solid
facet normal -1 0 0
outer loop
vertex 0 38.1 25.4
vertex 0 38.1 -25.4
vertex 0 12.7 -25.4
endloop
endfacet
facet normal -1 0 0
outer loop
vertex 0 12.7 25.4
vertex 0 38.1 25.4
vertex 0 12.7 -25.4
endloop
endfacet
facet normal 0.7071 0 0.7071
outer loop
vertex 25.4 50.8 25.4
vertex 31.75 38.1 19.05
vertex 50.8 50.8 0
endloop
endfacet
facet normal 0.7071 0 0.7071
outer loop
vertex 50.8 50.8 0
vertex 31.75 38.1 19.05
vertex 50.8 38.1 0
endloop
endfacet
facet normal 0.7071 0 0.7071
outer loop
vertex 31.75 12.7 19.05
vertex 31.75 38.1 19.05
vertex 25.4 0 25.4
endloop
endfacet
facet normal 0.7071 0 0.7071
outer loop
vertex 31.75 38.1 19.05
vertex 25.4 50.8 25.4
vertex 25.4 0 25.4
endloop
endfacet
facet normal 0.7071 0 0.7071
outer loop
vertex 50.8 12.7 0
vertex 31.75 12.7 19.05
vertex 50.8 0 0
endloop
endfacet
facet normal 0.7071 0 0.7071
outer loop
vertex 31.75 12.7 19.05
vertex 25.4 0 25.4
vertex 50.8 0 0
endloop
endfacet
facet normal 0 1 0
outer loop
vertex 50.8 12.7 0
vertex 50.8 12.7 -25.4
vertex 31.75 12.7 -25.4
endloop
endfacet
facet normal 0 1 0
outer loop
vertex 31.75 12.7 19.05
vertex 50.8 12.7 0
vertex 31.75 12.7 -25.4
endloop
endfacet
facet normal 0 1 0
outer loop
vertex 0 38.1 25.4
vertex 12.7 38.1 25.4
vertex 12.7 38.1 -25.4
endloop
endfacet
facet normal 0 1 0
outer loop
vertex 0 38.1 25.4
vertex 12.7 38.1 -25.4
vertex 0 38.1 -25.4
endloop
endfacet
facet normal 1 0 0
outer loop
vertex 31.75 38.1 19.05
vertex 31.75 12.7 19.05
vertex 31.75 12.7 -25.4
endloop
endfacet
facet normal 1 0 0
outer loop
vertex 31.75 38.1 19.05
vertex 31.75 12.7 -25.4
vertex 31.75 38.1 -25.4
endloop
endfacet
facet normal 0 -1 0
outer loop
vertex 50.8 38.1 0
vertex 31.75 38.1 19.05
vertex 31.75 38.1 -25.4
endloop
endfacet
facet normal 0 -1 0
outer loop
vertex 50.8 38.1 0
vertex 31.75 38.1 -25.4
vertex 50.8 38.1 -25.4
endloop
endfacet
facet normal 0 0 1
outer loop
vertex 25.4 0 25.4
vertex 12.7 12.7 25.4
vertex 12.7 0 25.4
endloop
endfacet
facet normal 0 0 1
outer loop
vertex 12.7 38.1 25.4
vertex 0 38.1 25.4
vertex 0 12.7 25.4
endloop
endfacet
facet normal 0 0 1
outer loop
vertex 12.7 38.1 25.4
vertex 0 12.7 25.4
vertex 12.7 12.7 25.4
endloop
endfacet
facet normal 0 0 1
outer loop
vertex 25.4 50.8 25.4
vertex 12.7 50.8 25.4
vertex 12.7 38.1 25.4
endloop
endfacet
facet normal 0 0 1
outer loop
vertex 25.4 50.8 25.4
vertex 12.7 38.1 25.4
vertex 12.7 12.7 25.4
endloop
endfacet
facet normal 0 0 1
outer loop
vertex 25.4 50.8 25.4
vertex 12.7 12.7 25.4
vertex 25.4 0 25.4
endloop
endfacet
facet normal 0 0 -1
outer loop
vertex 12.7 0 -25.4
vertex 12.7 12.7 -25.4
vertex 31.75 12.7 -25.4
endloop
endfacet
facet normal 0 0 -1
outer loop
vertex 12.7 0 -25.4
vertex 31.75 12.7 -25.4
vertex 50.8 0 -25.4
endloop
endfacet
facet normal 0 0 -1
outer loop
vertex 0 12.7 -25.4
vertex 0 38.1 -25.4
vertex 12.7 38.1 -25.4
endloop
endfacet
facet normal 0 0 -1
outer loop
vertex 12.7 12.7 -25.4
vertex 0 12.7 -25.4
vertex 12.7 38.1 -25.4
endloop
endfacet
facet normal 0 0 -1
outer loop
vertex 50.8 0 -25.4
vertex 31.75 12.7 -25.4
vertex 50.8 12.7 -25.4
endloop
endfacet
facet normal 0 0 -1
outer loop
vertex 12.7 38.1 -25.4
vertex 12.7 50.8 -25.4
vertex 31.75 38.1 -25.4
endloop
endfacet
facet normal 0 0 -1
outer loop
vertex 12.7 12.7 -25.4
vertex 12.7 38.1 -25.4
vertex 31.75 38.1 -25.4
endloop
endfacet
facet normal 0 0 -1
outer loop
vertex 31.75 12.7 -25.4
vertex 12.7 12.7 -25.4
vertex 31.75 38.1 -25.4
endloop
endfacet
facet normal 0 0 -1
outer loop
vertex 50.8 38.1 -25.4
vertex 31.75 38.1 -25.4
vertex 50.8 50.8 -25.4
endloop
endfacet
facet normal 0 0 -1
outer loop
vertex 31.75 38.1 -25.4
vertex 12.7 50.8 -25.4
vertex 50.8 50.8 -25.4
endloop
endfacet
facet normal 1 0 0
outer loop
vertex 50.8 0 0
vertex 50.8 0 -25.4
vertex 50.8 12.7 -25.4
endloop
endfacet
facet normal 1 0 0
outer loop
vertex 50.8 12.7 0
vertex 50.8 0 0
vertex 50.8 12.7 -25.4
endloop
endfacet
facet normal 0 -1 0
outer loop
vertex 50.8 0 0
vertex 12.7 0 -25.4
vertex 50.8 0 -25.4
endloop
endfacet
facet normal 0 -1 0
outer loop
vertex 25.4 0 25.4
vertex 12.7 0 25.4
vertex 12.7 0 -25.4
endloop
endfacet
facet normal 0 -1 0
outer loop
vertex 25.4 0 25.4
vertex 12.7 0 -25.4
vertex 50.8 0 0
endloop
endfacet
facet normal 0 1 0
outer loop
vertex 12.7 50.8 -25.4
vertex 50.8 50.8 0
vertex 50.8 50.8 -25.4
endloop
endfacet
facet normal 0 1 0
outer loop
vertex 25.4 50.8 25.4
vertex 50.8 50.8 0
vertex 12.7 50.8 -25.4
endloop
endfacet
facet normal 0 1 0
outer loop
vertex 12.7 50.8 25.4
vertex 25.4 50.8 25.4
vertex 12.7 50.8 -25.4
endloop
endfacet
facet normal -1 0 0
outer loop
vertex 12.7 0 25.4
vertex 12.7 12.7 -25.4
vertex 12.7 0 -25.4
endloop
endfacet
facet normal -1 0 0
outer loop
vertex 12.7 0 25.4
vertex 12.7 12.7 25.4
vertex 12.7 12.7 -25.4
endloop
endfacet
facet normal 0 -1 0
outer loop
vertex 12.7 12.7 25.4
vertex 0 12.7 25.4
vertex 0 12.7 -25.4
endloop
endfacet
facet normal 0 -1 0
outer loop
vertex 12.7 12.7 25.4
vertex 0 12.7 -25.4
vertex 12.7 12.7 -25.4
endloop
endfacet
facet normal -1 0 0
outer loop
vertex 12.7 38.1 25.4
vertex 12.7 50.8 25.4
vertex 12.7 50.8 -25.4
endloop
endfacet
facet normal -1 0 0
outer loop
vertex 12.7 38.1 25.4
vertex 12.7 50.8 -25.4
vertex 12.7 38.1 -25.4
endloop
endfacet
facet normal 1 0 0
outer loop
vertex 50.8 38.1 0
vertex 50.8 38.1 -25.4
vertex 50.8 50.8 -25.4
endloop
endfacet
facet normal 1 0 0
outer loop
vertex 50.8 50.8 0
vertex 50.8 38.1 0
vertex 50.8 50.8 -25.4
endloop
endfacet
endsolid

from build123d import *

# Parameters (mm, degrees)
F1_DEPTH = 25.4
F3_DEPTH = 50.801


with BuildPart() as f1:
    # F0 (on Top) → F1 (new body, symmetric)
    with BuildSketch(Plane.XY):
        Polygon((25.4, 50.8), (25.4, 0), (50.8, 0), (50.8, 12.7), (31.75, 12.7), (31.75, 38.1), (50.8, 38.1), (50.8, 50.8), align=None)
        Polygon((12.7, 12.7), (12.7, 0), (25.4, 0), (25.4, 50.8), (12.7, 50.8), (12.7, 38.1), (0, 38.1), (0, 12.7), align=None)
    extrude(amount=F1_DEPTH, both=True)

    # F2 (on face) → F3 (cut, through all)
    with BuildSketch(Plane.XZ):
        Polygon((25.4, 25.4), (50.8, 0), (50.8, 25.4), align=None)
    extrude(amount=-F3_DEPTH, mode=Mode.SUBTRACT)


solid = f1.part
